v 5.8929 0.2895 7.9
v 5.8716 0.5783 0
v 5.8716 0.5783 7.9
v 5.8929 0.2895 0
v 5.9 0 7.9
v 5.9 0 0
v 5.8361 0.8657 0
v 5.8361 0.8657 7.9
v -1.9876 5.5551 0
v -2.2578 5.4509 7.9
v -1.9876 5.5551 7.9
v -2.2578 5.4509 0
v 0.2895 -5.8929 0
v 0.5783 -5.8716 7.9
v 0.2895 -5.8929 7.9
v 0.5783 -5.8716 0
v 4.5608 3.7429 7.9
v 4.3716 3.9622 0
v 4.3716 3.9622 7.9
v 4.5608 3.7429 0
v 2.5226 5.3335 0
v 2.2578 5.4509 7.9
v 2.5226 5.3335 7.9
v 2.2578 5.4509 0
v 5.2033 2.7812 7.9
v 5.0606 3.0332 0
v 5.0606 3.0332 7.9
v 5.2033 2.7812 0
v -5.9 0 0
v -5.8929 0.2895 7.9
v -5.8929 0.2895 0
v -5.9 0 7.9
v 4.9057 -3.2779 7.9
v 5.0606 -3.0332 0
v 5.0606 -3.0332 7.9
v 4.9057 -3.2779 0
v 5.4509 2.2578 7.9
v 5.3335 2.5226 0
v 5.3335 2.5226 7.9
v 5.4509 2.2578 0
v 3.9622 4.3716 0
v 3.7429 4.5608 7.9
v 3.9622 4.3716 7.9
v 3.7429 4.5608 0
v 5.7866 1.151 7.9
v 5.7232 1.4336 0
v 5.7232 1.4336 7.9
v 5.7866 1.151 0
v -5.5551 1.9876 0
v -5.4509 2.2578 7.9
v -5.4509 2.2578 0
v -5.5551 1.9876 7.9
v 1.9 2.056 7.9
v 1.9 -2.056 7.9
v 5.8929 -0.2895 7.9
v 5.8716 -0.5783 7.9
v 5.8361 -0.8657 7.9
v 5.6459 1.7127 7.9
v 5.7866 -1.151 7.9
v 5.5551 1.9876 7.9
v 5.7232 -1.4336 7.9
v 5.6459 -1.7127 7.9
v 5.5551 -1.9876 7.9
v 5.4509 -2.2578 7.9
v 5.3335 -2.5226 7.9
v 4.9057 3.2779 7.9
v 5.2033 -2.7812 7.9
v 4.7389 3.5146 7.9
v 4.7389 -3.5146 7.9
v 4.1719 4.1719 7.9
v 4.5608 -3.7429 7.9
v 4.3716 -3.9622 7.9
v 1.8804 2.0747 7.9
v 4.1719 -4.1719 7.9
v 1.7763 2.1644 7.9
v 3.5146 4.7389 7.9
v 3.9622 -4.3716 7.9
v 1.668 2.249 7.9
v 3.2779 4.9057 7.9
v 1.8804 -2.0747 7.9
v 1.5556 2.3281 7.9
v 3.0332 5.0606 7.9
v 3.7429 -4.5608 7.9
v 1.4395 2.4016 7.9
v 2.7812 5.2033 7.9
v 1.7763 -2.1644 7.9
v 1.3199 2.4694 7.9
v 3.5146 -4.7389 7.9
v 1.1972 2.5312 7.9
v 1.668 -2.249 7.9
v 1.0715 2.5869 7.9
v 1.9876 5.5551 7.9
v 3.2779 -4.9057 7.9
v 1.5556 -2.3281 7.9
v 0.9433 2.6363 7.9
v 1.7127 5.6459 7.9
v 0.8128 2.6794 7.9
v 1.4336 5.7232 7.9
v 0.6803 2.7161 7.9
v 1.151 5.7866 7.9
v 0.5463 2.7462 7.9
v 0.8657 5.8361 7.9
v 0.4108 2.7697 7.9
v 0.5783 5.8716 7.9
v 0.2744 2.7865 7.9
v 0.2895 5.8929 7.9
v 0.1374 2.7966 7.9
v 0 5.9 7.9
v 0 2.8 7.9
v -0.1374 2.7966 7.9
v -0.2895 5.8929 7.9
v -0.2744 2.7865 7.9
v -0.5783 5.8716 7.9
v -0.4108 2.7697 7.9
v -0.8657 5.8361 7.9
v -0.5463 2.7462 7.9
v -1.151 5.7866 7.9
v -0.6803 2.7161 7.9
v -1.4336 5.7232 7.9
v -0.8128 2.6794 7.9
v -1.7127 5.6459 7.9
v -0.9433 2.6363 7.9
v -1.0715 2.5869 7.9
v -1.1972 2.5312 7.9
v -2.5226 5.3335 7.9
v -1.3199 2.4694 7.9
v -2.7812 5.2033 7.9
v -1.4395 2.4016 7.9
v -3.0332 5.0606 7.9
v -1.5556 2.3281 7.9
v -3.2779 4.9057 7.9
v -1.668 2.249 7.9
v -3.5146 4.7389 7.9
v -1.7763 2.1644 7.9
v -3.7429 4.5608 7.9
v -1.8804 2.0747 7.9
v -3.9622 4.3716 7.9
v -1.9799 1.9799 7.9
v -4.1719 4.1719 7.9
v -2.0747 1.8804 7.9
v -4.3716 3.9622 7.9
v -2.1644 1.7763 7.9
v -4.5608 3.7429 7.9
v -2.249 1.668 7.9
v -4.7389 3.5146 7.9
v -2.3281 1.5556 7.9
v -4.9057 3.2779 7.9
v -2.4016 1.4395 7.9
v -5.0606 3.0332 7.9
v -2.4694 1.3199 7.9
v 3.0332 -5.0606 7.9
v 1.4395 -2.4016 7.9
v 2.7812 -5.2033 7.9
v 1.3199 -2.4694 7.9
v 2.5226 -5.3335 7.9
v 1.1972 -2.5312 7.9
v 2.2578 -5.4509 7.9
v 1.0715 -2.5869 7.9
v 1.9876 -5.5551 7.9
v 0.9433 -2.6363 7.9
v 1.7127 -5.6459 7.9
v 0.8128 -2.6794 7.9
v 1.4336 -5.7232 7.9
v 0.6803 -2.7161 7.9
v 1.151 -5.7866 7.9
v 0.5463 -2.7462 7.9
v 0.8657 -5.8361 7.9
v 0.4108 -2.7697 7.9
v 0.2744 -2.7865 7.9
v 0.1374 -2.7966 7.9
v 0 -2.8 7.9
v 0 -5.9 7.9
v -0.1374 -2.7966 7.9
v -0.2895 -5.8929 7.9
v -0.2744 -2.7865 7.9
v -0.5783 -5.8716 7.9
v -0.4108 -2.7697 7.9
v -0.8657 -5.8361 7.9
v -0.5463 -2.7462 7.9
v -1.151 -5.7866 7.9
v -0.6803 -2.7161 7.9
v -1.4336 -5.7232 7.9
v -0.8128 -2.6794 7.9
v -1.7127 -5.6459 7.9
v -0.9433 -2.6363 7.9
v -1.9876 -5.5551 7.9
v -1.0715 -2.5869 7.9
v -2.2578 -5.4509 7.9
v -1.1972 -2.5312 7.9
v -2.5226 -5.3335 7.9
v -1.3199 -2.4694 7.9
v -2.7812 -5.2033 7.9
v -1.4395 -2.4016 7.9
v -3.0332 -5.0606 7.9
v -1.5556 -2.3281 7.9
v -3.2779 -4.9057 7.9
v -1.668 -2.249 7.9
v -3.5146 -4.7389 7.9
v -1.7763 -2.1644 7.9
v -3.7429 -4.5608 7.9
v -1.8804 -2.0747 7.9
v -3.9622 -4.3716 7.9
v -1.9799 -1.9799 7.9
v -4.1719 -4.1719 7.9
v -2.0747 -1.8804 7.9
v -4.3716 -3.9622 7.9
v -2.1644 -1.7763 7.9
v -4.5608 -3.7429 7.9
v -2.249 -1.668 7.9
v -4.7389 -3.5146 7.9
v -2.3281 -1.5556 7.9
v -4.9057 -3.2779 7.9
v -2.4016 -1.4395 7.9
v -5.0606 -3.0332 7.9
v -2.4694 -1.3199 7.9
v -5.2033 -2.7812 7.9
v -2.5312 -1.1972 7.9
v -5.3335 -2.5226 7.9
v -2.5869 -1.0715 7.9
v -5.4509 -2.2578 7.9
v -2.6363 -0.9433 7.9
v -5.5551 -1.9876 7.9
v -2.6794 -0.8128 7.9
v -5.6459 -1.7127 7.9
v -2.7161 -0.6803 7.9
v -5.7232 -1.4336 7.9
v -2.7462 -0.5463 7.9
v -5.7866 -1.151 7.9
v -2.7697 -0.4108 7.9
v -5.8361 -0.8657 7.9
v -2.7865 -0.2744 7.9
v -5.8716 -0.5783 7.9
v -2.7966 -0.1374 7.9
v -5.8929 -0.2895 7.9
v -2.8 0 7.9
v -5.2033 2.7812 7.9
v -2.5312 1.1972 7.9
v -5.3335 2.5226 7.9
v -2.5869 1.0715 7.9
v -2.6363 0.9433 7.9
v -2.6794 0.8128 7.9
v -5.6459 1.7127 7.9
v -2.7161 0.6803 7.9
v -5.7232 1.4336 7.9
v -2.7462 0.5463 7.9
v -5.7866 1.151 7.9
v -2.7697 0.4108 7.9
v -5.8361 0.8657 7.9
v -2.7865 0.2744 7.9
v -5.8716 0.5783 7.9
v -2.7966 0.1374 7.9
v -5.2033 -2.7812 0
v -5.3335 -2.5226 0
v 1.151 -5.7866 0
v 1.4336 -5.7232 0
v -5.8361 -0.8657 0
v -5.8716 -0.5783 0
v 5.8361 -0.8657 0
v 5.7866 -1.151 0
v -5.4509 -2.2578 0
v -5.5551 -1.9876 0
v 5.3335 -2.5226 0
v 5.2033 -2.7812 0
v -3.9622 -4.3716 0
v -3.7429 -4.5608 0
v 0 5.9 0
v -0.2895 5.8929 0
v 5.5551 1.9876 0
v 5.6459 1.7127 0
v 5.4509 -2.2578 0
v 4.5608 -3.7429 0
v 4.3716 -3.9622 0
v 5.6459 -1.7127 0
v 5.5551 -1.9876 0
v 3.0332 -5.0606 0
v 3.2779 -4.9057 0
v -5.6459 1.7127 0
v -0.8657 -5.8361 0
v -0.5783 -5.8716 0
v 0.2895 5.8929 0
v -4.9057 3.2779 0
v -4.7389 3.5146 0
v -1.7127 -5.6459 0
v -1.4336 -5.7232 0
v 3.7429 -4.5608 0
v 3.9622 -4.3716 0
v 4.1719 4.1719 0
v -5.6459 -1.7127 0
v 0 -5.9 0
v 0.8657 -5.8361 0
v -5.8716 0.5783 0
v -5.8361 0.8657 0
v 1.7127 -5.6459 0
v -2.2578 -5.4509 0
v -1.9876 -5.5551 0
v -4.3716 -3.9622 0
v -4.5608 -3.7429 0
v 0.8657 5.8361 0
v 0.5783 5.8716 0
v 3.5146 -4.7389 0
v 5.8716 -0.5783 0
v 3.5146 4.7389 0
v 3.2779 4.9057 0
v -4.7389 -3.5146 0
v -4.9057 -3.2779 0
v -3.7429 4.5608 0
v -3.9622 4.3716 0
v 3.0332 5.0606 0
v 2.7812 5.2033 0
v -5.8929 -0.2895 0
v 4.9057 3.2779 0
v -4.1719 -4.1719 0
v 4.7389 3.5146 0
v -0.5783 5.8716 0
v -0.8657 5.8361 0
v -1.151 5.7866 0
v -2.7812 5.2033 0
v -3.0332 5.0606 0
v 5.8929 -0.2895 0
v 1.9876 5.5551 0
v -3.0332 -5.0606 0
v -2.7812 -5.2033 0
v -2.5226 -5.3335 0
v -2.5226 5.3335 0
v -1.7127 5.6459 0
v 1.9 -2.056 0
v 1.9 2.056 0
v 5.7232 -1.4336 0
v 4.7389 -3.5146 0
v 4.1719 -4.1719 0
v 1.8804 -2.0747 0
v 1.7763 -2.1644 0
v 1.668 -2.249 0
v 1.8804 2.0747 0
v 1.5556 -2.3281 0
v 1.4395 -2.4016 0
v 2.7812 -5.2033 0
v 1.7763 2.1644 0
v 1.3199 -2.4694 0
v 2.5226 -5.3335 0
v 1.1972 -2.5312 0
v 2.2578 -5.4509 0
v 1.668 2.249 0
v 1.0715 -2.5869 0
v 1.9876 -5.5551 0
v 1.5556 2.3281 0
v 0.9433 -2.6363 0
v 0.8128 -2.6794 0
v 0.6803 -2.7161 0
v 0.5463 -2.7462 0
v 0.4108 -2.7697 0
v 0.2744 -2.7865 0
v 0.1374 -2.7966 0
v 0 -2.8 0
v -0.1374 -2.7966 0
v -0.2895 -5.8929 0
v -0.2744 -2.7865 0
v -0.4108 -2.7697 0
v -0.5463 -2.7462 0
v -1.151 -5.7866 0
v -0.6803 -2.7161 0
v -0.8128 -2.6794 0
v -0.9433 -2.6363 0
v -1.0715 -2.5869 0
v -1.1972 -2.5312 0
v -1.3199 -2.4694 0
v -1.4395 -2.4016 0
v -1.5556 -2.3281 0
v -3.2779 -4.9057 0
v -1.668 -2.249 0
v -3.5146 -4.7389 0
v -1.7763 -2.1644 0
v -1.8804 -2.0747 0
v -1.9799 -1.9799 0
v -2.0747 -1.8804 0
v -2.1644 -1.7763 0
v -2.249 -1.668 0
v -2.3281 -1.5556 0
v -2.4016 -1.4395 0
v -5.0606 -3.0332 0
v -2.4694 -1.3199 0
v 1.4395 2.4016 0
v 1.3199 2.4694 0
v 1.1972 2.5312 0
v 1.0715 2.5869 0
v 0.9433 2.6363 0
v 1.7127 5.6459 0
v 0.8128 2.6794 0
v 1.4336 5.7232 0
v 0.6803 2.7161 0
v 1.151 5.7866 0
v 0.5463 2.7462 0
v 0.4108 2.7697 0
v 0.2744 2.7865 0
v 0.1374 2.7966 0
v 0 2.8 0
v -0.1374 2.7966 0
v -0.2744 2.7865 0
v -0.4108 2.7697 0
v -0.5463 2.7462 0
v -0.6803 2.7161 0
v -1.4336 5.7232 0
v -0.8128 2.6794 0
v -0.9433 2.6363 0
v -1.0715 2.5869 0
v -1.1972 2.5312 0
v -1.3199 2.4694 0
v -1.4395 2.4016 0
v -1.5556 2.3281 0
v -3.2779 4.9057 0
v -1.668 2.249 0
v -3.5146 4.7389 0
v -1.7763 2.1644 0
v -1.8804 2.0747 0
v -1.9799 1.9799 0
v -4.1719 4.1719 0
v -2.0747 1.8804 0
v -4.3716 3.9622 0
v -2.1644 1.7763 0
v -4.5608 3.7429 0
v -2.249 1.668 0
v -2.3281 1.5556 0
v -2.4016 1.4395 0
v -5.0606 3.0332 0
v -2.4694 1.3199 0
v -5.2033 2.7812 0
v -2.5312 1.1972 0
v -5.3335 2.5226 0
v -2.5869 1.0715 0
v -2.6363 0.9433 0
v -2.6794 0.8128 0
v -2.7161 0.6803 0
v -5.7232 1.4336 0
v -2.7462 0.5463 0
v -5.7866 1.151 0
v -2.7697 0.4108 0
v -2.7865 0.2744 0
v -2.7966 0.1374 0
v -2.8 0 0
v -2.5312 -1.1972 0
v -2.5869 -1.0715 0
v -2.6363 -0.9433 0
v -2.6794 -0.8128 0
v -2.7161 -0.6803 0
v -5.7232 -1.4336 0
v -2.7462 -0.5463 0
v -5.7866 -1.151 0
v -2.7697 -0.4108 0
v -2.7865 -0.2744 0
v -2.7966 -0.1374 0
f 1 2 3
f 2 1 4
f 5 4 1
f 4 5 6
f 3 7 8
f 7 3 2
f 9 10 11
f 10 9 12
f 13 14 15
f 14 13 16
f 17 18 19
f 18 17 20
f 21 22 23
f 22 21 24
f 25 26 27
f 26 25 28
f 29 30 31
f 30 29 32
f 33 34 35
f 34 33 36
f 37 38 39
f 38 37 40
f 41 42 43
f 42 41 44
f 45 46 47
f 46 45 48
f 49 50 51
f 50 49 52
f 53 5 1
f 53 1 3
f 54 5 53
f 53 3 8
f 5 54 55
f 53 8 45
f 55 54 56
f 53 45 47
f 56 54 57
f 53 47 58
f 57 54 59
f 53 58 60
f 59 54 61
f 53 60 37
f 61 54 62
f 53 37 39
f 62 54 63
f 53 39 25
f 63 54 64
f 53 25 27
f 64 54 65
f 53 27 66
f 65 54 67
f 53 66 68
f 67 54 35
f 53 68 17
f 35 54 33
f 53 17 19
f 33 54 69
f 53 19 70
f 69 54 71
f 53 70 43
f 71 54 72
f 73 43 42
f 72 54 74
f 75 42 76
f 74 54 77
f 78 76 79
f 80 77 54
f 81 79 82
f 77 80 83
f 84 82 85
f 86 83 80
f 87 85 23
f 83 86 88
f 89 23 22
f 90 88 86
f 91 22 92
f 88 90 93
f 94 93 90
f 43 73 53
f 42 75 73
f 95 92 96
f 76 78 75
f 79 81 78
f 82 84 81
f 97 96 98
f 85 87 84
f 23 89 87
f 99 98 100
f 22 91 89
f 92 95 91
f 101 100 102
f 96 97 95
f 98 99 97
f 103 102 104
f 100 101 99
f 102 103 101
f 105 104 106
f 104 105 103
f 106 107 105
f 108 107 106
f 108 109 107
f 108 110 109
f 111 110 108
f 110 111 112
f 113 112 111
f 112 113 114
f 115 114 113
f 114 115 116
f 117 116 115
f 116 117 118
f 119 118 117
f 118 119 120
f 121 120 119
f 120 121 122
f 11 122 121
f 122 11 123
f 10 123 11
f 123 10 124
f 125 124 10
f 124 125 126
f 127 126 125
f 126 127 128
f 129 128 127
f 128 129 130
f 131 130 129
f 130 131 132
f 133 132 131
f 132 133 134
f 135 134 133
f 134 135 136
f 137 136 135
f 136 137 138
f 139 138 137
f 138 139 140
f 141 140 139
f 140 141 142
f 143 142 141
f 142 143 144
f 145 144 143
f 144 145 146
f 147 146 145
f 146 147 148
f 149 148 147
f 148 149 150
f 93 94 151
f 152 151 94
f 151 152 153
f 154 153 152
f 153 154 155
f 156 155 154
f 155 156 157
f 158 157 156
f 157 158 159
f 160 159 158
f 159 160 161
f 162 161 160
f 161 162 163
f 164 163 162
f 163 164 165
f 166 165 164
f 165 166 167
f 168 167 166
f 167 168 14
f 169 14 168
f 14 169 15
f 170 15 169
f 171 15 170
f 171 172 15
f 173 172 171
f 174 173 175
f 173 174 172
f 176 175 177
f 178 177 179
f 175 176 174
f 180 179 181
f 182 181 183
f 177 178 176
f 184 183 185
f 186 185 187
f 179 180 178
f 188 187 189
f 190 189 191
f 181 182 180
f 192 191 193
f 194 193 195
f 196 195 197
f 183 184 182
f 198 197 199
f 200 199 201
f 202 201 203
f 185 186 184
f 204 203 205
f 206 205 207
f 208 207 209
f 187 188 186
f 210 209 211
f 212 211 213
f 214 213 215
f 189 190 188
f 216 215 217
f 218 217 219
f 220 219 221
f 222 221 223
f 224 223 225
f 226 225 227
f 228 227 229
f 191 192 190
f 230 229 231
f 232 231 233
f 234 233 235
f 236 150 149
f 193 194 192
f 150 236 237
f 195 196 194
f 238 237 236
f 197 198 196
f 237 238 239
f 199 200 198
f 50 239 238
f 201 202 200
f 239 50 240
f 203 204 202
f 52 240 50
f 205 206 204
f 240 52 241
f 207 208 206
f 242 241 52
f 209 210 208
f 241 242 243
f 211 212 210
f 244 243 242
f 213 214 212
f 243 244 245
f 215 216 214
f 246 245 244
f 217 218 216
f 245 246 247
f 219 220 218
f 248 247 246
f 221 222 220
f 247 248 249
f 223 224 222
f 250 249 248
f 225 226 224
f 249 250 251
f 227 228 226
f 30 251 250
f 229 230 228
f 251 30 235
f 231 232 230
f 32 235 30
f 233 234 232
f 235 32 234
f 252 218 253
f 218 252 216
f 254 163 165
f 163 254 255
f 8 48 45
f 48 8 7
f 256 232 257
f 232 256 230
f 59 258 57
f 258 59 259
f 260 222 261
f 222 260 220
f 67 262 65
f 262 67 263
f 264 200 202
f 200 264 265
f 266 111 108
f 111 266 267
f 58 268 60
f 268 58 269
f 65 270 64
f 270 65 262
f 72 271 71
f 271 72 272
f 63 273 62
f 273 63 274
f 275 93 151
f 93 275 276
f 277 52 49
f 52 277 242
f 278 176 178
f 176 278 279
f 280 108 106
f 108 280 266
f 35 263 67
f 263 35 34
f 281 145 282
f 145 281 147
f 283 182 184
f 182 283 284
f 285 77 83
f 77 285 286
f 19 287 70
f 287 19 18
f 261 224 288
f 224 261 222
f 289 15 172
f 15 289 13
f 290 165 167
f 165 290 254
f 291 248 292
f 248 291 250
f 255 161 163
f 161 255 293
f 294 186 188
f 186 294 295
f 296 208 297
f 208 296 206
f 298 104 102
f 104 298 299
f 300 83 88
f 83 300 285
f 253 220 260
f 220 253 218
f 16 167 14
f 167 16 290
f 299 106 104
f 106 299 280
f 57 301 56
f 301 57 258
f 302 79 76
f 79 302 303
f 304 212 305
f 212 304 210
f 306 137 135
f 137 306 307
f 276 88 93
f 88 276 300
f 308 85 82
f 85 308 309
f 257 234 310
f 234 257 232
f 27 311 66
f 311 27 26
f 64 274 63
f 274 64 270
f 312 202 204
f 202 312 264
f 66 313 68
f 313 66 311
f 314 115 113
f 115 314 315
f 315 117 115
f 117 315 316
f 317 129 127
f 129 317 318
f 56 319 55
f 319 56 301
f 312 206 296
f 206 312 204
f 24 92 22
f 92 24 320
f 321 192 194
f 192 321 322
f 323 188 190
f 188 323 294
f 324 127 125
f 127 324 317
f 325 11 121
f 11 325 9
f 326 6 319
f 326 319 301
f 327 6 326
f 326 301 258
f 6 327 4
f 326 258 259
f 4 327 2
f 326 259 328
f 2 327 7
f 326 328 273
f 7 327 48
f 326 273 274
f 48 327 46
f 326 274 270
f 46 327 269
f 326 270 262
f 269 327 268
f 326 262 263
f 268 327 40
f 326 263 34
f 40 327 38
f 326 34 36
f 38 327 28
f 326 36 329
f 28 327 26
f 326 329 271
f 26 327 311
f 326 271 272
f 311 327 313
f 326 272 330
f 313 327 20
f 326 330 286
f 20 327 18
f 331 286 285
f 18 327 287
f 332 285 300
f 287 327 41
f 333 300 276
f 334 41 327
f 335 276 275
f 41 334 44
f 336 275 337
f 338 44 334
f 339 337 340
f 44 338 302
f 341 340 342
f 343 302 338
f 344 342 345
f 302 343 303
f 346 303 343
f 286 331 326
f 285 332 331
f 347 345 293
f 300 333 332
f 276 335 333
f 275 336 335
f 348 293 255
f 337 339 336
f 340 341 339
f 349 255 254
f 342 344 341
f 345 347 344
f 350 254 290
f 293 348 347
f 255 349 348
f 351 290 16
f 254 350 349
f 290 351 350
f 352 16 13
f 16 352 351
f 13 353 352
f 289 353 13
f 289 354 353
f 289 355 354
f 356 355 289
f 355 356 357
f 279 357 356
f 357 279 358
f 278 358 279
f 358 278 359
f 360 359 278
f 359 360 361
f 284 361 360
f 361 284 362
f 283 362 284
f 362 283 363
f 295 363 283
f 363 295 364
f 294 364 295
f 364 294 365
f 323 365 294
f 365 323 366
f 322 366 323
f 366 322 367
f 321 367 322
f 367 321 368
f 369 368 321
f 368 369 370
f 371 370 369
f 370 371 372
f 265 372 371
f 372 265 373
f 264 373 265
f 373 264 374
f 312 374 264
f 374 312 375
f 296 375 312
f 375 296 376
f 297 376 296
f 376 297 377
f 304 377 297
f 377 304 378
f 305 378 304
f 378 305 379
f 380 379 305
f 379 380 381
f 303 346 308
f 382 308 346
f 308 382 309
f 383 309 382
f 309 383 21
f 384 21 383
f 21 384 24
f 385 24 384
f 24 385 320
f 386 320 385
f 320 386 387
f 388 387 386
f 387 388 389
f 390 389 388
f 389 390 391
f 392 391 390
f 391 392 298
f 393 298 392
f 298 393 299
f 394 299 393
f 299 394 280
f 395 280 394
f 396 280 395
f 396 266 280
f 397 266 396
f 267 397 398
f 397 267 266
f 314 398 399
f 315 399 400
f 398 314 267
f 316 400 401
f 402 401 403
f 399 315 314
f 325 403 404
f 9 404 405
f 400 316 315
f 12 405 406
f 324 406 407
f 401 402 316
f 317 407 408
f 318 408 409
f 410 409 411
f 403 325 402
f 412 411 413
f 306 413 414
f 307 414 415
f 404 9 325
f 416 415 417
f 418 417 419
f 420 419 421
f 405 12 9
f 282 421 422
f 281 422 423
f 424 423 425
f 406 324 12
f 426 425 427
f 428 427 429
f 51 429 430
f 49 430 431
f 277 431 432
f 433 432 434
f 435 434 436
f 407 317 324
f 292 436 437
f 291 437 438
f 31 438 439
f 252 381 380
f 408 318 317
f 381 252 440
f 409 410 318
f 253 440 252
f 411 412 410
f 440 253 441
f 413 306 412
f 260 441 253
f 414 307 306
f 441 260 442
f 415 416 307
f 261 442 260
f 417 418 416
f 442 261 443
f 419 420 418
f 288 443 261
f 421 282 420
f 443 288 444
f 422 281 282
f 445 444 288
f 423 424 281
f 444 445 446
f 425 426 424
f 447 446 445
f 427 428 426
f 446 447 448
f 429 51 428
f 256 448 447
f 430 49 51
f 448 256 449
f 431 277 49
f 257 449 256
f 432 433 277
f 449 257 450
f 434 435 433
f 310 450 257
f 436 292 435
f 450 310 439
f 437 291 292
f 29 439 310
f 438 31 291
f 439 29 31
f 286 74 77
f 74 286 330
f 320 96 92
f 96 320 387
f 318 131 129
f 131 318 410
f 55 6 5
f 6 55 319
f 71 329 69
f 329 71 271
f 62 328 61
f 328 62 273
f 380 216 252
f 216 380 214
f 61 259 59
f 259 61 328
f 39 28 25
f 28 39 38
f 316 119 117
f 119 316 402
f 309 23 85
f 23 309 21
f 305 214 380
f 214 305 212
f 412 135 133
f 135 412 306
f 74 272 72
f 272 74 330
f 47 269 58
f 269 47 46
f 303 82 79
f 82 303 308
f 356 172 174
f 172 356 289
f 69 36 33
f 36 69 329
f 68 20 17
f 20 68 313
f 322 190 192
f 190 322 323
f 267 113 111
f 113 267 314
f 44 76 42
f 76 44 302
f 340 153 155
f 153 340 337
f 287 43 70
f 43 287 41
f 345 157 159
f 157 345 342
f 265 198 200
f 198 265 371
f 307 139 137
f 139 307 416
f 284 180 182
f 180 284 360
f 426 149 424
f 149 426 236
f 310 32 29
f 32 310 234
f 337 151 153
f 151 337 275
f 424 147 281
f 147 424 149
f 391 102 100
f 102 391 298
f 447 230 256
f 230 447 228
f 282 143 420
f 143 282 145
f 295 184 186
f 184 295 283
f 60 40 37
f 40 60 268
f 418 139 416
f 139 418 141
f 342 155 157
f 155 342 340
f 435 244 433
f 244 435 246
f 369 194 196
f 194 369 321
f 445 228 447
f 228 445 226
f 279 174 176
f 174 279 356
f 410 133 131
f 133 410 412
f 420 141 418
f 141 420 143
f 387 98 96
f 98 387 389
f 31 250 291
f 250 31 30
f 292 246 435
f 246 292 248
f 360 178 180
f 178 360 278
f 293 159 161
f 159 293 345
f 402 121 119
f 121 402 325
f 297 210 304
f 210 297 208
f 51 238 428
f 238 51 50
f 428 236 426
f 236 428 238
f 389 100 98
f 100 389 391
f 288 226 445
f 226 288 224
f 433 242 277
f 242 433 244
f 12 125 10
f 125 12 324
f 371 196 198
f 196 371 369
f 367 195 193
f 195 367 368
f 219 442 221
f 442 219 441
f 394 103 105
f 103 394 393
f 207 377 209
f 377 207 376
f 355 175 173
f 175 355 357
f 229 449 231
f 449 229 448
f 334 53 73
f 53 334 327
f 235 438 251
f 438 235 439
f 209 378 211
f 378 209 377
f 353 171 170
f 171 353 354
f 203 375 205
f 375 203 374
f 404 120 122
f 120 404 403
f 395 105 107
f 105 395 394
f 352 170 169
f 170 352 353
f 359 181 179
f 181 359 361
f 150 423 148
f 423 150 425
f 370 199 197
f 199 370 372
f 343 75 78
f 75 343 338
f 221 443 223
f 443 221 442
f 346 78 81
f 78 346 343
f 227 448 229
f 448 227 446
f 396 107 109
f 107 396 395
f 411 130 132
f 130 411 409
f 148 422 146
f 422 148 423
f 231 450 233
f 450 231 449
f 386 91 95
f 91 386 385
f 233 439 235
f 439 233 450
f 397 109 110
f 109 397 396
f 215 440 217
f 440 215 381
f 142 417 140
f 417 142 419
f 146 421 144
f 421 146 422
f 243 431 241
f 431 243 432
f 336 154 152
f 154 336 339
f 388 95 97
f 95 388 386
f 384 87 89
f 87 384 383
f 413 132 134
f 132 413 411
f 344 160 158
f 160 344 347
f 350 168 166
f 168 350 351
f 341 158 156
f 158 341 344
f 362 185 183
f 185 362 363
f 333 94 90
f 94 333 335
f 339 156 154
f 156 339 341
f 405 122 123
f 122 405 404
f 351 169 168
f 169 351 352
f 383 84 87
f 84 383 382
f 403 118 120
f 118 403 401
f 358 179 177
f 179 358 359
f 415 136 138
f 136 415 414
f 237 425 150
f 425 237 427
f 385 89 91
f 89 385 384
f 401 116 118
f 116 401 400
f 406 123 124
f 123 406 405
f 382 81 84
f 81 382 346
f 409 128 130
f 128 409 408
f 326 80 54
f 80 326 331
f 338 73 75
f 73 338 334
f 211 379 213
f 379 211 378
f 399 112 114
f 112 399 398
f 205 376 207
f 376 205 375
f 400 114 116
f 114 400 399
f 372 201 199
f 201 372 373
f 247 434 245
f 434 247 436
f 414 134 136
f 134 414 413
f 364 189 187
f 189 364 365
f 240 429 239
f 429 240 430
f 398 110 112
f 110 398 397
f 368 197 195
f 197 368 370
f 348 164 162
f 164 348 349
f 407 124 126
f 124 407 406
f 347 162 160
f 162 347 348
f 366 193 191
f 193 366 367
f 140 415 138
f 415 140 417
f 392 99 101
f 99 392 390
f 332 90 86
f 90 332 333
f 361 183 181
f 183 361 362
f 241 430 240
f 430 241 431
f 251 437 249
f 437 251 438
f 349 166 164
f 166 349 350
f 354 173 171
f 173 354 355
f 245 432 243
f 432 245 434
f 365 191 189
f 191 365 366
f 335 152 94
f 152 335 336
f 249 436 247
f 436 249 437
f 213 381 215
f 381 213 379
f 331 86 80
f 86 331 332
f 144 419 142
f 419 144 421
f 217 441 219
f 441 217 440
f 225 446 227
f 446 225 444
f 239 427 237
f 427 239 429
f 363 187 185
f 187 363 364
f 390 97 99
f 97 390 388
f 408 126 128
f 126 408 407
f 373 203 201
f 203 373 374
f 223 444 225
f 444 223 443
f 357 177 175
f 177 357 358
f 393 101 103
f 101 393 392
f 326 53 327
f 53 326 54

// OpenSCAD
$fn = 128;


module base(){
    cylinder(h=7.9,d=11.8);
}

module eixo(){
    translate([0,0,-1])
    cylinder(h=10,d=5.6);

}

union(){
    difference(){
        base();
        eixo();
    }

    translate([1.9,-2.5,0])
    cube([1,5,7.9]);
}
